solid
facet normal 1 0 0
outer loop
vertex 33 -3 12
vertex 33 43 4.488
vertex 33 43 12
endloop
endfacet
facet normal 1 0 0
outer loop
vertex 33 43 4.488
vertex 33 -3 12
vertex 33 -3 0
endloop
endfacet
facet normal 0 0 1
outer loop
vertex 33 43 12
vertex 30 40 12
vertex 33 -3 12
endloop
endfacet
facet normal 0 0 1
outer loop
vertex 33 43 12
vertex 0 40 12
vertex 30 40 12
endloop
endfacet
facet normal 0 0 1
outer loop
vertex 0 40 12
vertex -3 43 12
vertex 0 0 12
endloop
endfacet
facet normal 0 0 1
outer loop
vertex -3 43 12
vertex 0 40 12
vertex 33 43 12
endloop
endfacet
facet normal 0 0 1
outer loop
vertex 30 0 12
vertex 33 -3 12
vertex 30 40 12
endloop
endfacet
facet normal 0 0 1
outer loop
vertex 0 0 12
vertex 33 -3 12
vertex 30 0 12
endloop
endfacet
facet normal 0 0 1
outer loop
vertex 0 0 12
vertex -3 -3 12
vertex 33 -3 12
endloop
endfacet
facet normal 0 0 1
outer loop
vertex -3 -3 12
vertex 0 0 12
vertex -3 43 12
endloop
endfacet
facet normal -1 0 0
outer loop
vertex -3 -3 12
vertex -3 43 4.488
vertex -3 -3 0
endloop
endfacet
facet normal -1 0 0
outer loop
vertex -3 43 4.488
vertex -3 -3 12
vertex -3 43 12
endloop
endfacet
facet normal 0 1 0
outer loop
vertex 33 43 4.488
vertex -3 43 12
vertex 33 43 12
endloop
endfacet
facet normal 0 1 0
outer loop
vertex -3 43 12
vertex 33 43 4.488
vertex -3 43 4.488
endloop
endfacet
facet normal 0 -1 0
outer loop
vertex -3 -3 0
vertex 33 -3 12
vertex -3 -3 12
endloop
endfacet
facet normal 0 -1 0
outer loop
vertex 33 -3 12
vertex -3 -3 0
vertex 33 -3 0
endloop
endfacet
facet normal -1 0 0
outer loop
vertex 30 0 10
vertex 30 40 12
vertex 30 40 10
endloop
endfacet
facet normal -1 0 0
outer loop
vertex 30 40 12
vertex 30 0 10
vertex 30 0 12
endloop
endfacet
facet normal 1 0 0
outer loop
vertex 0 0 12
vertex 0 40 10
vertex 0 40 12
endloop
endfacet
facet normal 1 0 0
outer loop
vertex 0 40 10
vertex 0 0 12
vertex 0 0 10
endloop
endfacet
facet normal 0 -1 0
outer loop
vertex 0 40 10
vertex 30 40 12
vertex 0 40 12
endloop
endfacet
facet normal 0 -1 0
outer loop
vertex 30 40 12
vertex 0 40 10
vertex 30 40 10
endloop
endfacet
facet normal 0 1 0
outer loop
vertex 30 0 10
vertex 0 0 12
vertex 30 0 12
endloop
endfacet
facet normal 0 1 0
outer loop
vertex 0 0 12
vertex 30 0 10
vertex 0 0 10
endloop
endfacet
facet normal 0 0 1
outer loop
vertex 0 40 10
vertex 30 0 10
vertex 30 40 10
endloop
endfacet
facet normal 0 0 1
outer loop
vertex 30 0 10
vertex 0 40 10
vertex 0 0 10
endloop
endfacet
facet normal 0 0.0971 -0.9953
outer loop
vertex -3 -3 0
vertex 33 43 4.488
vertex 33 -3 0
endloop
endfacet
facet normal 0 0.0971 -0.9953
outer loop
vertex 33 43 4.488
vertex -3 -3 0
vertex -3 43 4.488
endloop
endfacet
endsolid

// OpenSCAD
/** Create Wedge **/
/*      
Universal Adjustabel Wedge by Chris Schaefer is licensed under the Creative Commons - Attribution - Non-Commercial license. 
*/

// MB Interface

/* [Slope] */
// from leg to leg
Slope_Length=120;
// how high is the gap? equals the wedge hight
Gap_Height=10;

/* [Wedge Size] */
// how wide is the wedge? along the gap
Wedge_X=30;
// length of the wedge, along the slope
Wedge_Y=40;

// Should the wedge have edges to prevent rolling off?
/* [Edge] */
// the width will be added around the wedge
Edge_Width=3.0;
// the hight will be added to the gap size.
Edge_Height=2.0;


// Interface End
/* [Hidden] */
// Length
LEN=Slope_Length; 
// Gap 
GAP=Gap_Height;

// Block size
/* [Block Size] */
// width (width at the max hight)
X=Wedge_X;
// length (length along the slope)      
Y=Wedge_Y;

// edge around the block to stop rolling off
EDGE=Edge_Width;    // edge border thickness
EDGE_H=Edge_Height;  // hight of the edge

// ========================================================
// Block is:
module block () {
    // Block size
    cube(size = [ X, Y, GAP ], center = false);
    // Edge added
    translate([-EDGE, -EDGE, 0])
        difference ()
          {
            cube(size = [ X+2*EDGE, Y+2*EDGE, GAP+EDGE_H ], center = false);
            translate ([EDGE, EDGE,0])
              cube(size = [ X, Y, GAP+EDGE_H ], center = false);
          }
      }


 
 
module wedge () {
    // Wedge with the right slop
        // shift and rotate it into place
            translate ( [-EDGE,-0,GAP] )
            rotate ([0,90,0])
        // wedge
        linear_extrude(height = X+2*EDGE)
         polygon( points=[[-EDGE_H,-EDGE],[-EDGE_H,LEN],[GAP,-EDGE]]  );
    
 }
 
// limit the block to the wedge, gives it the right slope.
intersection () 
 {
      block ();
      wedge ();
  }
  
